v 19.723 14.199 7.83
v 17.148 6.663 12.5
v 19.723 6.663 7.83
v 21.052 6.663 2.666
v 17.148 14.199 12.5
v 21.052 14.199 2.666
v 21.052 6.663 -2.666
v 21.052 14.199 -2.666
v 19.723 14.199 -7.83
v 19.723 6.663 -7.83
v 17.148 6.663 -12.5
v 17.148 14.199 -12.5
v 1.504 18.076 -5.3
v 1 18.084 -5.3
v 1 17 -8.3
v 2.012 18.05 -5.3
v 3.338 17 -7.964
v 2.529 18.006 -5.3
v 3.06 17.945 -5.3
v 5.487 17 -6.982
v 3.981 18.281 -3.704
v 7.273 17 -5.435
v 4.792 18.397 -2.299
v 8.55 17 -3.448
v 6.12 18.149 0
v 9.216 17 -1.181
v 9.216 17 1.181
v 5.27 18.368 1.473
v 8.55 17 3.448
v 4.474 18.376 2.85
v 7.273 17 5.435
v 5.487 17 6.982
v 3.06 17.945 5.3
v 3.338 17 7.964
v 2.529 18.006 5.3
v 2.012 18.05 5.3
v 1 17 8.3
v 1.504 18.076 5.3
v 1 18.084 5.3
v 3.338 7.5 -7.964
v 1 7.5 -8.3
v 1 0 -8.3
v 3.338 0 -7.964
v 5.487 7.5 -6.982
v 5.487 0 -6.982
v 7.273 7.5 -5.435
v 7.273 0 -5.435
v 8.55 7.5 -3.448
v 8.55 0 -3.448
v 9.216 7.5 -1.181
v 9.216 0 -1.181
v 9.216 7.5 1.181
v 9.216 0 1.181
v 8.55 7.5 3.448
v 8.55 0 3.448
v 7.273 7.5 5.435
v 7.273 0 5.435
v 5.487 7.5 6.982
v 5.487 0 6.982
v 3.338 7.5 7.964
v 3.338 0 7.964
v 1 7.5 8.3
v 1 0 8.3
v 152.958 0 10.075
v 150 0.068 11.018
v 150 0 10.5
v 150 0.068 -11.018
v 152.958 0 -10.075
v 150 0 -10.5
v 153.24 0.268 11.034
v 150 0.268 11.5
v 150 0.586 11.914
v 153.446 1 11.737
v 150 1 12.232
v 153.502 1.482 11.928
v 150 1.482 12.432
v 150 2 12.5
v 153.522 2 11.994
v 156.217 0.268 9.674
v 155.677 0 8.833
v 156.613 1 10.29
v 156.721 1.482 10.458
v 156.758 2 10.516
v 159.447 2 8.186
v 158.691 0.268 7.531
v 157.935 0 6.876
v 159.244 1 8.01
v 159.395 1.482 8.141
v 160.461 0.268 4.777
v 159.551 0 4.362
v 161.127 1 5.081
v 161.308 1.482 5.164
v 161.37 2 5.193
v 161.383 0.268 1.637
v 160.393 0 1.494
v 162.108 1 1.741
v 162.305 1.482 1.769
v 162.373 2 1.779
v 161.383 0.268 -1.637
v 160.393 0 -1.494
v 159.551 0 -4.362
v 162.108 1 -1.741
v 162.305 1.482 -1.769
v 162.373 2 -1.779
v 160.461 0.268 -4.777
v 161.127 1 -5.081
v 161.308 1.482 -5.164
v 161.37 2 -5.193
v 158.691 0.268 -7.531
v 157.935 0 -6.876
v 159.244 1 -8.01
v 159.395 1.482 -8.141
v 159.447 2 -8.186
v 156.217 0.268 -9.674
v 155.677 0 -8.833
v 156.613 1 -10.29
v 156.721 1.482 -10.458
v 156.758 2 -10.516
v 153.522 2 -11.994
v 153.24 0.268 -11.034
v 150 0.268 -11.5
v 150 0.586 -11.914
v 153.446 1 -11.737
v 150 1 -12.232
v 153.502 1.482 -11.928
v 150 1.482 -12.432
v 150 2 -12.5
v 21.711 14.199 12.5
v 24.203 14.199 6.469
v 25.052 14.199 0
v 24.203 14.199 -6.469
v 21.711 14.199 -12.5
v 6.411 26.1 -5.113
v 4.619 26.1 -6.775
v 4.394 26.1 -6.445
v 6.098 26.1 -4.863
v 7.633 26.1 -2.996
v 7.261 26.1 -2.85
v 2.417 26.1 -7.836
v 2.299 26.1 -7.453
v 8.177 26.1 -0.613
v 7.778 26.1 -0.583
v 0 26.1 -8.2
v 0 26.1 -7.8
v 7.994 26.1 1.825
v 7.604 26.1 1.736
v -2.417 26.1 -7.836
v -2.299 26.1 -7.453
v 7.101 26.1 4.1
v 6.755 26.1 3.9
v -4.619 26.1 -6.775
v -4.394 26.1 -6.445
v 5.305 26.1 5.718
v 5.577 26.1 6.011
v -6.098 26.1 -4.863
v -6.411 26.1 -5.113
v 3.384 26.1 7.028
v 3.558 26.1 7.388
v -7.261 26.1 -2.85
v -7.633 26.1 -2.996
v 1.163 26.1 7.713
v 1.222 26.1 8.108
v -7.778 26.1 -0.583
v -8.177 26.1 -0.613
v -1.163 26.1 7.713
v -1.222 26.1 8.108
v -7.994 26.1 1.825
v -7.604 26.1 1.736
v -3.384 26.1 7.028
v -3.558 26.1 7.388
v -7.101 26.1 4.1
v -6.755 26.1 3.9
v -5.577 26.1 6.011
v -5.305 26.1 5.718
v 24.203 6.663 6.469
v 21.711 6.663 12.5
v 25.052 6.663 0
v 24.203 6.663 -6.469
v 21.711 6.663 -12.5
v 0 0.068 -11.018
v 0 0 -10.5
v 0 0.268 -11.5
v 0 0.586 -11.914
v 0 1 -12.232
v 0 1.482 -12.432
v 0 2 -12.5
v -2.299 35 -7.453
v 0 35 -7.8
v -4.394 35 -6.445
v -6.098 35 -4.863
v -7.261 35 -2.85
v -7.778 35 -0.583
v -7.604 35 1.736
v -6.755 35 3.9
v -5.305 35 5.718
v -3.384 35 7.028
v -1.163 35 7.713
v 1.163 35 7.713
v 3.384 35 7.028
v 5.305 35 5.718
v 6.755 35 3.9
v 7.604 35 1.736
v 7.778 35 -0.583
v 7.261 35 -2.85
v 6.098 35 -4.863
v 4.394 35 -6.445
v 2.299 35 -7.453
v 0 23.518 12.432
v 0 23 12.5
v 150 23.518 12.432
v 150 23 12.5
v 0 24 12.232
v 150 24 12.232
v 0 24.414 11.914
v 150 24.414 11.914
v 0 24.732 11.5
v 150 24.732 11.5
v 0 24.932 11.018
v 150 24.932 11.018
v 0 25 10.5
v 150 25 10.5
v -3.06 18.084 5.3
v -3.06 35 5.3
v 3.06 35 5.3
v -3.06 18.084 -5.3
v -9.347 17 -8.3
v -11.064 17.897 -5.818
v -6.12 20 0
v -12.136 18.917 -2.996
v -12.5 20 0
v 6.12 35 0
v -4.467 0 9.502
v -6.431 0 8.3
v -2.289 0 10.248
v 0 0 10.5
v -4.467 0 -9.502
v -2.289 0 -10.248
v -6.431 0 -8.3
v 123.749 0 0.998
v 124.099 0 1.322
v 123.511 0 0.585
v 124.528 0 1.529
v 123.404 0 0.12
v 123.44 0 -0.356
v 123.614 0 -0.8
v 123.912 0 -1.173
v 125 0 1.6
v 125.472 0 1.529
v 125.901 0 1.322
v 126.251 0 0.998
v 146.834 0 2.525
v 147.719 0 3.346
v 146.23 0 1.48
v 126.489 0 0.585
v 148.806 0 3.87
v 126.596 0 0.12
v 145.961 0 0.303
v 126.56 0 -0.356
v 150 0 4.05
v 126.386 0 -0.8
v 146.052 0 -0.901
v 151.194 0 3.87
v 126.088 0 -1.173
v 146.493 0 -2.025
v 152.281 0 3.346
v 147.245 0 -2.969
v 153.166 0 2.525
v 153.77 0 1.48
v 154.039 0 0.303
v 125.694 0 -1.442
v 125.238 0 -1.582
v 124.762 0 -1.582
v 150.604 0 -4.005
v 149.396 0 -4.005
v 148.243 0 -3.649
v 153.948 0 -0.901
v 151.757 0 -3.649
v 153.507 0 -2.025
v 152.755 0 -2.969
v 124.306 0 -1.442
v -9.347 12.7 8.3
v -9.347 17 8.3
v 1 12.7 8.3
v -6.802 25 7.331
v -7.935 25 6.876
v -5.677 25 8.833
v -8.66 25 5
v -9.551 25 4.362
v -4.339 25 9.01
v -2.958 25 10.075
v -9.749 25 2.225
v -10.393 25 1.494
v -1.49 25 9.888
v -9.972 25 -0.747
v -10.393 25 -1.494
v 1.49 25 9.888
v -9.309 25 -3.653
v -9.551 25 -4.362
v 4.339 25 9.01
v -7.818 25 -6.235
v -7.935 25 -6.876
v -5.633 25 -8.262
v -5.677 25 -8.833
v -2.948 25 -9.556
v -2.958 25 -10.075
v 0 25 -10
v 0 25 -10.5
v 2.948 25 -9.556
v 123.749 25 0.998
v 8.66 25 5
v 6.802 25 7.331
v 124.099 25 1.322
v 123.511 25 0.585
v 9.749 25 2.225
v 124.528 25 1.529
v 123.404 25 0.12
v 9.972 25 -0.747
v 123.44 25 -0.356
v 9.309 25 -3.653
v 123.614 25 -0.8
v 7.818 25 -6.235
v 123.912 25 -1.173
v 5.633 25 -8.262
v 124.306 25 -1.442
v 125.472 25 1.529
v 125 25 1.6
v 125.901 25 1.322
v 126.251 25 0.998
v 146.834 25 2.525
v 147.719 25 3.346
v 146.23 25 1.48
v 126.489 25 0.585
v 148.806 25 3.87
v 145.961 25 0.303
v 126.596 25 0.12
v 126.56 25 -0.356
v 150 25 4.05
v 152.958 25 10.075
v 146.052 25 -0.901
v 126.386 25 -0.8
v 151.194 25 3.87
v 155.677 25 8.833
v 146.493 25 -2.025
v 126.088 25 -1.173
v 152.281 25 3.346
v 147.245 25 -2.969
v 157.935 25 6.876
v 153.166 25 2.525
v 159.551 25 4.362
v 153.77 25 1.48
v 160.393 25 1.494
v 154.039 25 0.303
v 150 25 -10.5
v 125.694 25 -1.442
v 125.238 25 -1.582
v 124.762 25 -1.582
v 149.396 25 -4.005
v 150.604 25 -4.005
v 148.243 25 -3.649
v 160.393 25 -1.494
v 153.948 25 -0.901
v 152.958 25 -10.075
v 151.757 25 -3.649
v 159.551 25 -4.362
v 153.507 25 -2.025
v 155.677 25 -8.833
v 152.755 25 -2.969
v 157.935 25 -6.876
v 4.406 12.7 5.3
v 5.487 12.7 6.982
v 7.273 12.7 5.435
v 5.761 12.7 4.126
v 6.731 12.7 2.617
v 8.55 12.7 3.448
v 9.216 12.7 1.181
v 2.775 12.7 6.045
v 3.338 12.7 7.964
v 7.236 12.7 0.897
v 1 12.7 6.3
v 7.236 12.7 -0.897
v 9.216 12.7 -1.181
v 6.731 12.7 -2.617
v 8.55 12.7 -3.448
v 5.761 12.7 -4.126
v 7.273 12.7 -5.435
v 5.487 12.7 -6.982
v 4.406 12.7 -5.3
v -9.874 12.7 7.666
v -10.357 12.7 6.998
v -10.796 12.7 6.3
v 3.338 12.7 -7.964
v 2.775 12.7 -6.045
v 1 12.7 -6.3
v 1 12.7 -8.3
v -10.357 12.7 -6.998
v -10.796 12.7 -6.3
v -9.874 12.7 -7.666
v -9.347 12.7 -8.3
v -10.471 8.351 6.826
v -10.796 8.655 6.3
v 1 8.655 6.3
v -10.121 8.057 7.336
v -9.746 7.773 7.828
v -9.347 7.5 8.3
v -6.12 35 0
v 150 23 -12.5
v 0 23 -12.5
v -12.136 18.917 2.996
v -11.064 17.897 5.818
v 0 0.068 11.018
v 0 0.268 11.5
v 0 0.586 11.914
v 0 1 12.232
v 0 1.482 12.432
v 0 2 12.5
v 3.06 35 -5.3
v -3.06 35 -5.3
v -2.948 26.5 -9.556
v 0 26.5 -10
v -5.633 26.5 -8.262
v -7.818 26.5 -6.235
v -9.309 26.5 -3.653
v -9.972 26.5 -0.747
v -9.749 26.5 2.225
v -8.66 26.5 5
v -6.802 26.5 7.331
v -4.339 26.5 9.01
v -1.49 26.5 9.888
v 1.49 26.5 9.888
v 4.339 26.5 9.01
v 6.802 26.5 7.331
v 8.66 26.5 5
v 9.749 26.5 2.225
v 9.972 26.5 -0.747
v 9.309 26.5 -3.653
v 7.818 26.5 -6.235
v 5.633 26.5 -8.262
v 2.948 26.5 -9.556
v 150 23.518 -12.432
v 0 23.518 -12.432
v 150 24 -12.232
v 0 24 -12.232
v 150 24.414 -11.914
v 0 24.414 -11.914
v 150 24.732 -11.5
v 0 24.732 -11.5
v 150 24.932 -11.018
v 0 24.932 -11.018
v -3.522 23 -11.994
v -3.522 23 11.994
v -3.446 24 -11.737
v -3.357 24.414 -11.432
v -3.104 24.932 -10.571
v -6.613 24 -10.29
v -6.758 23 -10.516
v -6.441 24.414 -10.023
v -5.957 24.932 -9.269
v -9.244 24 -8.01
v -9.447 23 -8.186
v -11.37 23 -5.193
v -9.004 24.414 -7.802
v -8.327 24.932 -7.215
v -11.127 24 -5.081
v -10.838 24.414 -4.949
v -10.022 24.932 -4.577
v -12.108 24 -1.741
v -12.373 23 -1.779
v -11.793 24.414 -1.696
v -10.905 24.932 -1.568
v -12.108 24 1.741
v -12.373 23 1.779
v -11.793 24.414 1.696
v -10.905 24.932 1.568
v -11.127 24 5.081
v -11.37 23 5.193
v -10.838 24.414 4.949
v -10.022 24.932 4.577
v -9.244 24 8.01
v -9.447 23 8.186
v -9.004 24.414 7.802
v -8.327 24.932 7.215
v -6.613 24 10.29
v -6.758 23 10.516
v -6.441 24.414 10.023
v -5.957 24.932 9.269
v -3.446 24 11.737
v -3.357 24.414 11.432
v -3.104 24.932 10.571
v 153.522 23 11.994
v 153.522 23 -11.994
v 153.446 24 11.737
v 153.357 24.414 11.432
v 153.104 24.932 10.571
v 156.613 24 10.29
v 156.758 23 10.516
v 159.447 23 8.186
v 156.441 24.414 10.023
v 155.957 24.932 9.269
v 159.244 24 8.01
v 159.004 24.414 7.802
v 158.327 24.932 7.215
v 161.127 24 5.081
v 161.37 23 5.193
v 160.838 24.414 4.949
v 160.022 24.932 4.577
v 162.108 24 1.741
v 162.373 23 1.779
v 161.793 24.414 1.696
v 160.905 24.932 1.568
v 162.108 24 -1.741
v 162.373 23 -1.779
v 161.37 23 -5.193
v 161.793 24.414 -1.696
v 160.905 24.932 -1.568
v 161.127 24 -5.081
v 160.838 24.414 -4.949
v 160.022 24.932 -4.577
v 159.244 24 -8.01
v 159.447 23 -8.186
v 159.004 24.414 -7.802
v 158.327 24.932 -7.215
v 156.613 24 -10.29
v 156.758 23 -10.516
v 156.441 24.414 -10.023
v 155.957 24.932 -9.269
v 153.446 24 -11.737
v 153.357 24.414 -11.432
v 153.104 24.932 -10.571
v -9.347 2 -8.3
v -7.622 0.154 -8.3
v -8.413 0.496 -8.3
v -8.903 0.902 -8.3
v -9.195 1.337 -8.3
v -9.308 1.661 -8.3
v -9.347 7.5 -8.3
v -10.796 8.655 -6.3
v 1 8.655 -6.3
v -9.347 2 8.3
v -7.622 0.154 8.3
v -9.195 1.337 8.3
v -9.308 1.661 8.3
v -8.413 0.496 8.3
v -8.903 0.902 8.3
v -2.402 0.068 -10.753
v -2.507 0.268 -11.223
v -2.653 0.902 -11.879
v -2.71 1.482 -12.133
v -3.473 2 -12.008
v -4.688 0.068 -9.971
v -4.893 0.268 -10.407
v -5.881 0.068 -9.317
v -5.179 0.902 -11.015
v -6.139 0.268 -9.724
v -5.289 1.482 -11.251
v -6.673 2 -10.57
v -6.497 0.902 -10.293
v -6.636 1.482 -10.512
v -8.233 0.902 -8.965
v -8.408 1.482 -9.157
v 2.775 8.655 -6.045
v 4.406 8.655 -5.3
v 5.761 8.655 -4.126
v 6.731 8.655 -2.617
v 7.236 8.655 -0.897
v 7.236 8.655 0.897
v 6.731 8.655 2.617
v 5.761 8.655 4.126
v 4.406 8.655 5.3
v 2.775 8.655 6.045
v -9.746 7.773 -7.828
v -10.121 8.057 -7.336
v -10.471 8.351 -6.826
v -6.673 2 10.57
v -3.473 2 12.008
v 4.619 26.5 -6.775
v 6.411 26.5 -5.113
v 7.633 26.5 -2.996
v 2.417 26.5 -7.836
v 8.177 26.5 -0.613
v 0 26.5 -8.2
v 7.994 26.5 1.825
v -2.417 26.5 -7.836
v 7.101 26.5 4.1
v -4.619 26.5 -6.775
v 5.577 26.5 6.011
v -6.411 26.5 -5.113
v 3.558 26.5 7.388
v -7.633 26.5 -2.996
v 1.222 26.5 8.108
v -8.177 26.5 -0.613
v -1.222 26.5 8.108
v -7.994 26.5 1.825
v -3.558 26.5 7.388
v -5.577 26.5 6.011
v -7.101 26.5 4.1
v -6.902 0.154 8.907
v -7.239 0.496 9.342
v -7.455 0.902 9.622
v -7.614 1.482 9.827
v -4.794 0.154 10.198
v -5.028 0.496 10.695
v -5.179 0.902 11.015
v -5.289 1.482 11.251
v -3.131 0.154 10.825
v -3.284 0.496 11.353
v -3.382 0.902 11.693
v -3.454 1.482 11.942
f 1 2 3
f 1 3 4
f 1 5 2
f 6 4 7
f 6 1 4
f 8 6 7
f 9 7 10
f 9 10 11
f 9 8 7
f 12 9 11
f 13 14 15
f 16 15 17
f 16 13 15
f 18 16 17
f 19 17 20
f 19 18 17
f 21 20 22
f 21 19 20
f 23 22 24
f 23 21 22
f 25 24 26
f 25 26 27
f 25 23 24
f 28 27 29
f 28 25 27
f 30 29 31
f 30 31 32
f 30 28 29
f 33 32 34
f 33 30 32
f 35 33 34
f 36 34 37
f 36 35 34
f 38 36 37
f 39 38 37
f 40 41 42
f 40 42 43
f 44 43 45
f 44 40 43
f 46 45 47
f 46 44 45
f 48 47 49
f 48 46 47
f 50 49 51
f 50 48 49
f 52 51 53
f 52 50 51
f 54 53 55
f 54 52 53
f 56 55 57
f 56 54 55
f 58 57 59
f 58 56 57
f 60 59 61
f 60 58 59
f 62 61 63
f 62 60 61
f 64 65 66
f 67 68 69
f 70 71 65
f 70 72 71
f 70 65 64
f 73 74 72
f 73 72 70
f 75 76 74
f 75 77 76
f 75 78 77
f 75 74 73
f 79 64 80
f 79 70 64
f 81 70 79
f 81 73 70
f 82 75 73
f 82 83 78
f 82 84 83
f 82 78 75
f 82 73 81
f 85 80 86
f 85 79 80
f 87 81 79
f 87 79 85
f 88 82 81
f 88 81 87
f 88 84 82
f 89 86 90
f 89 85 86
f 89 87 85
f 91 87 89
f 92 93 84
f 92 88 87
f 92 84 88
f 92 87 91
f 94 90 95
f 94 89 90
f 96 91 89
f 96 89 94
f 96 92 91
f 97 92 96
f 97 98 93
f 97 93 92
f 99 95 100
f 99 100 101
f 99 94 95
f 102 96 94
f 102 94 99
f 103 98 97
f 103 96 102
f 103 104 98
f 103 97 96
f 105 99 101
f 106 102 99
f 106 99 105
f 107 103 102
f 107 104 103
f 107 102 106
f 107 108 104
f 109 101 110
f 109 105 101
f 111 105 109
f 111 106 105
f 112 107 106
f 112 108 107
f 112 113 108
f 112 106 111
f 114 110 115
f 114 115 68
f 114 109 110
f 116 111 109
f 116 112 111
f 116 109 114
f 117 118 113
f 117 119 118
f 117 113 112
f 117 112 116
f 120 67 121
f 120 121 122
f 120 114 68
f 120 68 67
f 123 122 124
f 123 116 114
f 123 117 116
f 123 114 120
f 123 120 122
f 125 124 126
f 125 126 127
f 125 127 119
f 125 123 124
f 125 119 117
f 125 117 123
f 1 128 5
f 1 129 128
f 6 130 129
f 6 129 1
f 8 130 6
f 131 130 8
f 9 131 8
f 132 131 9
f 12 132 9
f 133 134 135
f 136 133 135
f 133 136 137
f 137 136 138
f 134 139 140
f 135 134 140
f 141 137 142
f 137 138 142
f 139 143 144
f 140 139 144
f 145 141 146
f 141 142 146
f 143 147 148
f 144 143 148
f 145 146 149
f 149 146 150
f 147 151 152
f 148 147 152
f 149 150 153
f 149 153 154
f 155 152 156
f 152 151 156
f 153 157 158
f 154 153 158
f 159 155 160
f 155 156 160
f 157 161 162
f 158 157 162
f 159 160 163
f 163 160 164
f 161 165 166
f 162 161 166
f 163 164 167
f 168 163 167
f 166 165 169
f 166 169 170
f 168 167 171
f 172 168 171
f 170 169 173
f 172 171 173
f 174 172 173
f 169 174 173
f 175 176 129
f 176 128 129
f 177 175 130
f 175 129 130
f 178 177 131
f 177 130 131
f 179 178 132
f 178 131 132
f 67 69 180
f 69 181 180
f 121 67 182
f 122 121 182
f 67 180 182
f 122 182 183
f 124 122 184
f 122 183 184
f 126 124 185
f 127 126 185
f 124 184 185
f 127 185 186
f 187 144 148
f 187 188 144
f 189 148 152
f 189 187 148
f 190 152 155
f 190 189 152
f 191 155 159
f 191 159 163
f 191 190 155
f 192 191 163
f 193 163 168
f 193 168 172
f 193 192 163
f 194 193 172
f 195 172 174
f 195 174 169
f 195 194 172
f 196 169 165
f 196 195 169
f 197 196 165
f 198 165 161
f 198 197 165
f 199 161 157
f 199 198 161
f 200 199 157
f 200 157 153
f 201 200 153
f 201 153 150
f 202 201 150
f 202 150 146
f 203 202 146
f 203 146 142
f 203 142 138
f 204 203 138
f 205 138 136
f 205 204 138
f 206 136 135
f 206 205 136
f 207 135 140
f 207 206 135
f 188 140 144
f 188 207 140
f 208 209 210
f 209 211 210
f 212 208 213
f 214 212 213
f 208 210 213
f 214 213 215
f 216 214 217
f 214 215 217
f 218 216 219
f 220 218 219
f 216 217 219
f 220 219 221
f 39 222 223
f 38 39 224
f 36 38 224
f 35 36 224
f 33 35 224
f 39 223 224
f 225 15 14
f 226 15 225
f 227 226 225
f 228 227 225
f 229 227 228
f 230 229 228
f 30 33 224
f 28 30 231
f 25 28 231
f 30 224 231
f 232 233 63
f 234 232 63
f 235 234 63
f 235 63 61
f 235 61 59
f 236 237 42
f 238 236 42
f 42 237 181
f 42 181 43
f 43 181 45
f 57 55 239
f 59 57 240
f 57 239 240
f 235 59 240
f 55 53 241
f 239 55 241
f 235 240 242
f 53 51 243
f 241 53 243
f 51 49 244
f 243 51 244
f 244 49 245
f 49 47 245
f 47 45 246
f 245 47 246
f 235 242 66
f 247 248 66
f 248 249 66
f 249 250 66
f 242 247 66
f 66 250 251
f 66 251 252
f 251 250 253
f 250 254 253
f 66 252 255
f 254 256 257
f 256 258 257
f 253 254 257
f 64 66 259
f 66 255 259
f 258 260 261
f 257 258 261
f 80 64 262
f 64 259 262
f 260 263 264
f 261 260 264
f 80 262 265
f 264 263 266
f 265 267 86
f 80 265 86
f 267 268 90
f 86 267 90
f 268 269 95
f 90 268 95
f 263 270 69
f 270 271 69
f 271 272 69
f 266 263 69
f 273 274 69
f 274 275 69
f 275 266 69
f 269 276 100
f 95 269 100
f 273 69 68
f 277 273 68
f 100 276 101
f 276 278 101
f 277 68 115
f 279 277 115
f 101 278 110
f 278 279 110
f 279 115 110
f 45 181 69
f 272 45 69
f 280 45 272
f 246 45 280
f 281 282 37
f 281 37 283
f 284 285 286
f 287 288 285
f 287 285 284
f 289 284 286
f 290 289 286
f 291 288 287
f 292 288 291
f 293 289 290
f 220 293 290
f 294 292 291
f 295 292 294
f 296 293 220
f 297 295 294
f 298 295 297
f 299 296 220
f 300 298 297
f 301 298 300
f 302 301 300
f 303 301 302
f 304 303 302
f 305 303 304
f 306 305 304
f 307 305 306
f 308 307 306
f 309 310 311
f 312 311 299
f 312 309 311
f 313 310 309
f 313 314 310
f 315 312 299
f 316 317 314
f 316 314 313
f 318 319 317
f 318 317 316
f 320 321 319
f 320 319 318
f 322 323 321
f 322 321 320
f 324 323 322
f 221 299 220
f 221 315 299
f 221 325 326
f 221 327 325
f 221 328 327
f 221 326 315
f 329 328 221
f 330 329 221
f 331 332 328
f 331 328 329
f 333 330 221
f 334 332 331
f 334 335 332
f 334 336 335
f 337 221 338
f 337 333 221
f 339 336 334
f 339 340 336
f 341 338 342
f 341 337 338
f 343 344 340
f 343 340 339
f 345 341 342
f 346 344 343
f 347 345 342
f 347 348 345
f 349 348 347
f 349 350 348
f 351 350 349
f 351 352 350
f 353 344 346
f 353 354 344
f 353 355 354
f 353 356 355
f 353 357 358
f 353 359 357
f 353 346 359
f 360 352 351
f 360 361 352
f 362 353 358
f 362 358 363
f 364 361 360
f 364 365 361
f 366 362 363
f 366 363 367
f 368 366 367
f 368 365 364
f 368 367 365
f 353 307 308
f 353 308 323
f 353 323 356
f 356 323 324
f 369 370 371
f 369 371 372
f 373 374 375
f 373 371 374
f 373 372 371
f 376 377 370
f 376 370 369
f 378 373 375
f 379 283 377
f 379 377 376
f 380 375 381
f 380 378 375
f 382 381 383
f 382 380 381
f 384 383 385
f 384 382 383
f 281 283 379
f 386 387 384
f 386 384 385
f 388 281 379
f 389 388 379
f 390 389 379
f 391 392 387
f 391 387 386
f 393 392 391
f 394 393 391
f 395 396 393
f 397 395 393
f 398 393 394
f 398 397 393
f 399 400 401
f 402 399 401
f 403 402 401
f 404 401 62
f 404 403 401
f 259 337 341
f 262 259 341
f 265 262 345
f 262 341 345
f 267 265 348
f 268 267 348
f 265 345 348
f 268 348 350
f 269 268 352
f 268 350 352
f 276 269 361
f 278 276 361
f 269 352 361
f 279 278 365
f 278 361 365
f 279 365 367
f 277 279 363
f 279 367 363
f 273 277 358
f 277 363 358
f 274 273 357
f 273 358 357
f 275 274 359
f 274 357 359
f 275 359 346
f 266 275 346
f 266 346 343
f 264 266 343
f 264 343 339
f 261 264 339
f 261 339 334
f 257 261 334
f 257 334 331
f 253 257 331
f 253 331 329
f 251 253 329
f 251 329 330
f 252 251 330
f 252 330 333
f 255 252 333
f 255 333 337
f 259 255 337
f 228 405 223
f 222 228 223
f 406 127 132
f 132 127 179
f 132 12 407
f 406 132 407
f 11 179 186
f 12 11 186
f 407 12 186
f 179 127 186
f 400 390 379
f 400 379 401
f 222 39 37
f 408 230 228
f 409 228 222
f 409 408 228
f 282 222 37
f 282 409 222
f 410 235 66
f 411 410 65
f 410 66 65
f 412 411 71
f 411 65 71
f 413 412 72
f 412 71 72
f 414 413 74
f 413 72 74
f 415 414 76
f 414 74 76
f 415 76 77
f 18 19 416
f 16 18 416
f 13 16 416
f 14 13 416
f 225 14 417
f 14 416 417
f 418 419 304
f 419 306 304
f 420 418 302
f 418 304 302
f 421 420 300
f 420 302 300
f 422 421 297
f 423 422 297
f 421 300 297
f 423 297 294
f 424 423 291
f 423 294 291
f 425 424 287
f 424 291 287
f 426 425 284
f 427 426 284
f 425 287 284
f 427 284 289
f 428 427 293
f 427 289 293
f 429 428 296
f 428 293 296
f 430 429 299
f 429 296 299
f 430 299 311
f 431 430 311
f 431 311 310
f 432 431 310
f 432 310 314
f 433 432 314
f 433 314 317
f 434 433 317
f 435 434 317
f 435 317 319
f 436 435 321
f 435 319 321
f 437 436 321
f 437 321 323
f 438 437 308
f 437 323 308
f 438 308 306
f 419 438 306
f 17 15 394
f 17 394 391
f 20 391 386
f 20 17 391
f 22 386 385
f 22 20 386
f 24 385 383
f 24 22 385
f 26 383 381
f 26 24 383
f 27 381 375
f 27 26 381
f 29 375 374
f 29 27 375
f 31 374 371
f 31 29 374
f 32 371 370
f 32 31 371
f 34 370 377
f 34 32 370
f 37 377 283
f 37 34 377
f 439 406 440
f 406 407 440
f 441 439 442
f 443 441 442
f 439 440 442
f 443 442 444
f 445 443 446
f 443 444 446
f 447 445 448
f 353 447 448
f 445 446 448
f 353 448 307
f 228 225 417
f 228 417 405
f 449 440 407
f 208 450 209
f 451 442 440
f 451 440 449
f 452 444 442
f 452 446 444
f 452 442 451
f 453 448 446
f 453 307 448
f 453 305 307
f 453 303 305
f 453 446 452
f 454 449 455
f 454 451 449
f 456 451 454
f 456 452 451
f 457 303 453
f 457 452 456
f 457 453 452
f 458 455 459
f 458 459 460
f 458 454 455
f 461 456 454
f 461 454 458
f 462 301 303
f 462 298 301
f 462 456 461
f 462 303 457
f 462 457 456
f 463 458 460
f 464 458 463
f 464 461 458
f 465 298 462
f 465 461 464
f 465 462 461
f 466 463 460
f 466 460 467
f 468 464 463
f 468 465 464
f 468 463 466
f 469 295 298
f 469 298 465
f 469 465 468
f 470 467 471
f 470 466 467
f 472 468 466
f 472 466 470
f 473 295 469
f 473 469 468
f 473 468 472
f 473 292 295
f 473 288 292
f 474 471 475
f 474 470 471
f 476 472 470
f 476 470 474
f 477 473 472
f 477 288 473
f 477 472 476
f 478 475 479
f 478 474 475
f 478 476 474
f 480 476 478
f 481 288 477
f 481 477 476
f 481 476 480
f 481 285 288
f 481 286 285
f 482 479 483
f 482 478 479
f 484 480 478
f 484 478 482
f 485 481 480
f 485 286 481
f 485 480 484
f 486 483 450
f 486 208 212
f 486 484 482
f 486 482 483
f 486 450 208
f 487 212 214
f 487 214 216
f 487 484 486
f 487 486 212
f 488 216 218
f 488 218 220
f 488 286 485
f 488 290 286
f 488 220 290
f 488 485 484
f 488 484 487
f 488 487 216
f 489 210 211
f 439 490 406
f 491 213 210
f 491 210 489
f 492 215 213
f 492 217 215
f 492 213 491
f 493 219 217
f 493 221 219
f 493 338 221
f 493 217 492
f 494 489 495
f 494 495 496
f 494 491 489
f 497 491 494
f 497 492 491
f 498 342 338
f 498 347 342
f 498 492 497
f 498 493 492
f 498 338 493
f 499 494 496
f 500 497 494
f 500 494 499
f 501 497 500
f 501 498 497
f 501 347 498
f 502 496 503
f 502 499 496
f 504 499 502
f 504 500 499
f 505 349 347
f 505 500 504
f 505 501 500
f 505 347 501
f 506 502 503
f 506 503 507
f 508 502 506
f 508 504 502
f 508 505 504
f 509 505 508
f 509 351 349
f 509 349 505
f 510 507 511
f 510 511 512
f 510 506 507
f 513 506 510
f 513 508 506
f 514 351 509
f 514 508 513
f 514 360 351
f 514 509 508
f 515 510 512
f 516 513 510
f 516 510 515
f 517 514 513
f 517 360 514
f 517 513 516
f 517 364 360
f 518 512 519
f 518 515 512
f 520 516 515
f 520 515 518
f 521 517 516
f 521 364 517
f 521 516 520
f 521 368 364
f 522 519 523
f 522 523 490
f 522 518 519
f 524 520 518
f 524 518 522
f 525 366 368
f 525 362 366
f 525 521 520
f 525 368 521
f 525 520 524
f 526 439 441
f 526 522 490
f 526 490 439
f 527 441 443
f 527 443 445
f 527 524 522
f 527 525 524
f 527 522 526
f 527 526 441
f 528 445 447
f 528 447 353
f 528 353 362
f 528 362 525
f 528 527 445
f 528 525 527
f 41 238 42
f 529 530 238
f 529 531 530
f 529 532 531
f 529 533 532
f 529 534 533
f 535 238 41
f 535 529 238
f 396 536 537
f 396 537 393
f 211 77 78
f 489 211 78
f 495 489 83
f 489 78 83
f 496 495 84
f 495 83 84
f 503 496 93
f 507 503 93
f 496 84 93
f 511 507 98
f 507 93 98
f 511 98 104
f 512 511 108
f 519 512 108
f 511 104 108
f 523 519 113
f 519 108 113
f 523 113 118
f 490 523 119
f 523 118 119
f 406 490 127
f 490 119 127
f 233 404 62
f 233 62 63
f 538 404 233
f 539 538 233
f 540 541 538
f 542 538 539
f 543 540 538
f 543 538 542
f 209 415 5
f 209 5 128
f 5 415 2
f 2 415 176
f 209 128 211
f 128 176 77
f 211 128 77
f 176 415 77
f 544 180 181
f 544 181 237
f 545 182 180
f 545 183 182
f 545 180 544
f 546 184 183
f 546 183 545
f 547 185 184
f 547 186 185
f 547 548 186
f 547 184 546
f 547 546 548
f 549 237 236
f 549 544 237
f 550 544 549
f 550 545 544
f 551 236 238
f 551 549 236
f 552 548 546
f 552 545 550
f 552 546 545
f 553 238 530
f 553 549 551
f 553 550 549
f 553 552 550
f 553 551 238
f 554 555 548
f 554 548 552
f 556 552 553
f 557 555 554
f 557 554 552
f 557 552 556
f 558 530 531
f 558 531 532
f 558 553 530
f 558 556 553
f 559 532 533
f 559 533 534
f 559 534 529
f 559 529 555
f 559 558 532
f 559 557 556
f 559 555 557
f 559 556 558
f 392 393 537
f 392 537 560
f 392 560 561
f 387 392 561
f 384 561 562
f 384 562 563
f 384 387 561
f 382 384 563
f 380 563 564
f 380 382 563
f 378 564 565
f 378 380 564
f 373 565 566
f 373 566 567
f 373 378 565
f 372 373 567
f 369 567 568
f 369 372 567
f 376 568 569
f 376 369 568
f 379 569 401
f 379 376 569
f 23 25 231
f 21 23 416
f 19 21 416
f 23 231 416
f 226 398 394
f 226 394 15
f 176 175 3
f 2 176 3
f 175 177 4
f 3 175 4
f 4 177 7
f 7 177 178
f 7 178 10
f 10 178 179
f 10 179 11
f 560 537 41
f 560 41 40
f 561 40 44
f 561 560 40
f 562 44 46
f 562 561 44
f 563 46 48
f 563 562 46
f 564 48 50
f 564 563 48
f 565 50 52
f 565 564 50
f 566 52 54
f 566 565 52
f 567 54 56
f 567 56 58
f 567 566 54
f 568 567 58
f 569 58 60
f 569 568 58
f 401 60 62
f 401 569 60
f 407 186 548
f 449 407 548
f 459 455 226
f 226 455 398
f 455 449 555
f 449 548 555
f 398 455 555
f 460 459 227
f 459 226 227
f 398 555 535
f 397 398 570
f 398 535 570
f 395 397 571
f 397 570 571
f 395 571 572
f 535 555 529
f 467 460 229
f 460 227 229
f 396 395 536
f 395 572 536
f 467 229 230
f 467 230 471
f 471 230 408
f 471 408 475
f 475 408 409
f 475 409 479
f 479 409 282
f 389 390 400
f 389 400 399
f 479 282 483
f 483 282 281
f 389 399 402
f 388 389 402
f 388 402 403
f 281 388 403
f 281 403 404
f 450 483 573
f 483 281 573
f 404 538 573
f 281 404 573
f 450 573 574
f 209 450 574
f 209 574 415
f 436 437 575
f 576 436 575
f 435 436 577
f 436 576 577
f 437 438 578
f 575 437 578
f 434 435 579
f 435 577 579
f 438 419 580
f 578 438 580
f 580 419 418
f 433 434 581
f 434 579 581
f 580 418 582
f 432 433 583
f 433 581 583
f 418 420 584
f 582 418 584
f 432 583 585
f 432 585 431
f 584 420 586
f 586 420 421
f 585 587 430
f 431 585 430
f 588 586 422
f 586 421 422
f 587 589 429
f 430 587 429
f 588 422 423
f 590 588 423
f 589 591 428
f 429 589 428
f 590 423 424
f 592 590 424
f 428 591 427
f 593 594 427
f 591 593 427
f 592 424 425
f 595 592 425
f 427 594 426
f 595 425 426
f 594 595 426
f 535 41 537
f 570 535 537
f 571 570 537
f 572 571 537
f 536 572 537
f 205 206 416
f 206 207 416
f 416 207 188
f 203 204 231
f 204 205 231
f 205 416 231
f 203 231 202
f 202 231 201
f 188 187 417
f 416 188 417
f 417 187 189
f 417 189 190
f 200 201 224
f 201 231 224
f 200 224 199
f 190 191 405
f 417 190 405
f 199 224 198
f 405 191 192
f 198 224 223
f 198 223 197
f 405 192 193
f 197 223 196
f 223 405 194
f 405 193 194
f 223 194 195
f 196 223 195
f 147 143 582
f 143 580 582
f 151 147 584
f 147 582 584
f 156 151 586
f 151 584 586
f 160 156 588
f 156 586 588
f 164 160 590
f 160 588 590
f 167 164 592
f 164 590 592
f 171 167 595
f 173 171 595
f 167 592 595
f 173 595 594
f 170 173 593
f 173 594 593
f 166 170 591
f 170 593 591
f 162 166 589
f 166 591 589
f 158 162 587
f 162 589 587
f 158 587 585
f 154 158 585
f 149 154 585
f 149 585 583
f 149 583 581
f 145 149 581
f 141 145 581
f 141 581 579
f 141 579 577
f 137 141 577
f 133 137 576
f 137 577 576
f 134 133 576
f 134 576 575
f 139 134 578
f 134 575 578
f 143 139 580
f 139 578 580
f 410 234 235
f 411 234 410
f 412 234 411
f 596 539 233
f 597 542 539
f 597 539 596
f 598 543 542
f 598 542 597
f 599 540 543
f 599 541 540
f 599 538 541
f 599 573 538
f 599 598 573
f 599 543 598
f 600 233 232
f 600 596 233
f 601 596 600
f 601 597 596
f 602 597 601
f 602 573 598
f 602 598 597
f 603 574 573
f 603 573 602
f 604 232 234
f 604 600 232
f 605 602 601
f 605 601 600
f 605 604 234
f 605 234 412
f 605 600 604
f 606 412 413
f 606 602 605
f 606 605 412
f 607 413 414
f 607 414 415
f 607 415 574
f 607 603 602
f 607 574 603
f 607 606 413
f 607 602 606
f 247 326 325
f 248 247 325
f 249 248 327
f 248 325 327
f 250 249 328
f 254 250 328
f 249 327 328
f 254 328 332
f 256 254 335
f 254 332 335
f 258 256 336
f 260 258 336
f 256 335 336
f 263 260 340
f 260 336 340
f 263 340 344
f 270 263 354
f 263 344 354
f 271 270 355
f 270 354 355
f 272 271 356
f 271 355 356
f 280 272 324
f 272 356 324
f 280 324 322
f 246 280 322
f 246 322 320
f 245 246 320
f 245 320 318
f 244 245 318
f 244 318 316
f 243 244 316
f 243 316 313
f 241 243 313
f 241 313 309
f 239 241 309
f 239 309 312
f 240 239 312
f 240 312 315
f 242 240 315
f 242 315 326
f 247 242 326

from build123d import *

# Parameters (mm, degrees)
SALIENTE_EXTRUIR1_DEPTH    = 25
CROQUIS5_R                 = 4.05
CROQUIS5_R_2               = 1.6
CORTAR_EXTRUIR1_DEPTH      = 51.5
REDONDEO2_R                = 2
CORTAR_EXTRUIR2_REACH      = 168.696
CORTAR_EXTRUIR4_DEPTH      = 1
CORTAR_EXTRUIR4_DEPTH_BACK = 167.695830887
CROQUIS13_W                = 3.831890827
CROQUIS13_H                = 7.53605196


with BuildPart() as part:
    # Croquis2 → Saliente-Extruir1 (new body)
    with BuildSketch(Plane(origin=(0, 0, 0), x_dir=(1, 0, 0), z_dir=(0, 1, 0))):
        with BuildLine():
            Line((0, -12.5), (150, -12.5))
            ThreePointArc((150, -12.5), (162.5, 0), (150, 12.5))
            Line((150, 12.5), (0, 12.5))
            ThreePointArc((0, 12.5), (-12.5, 0), (0, -12.5))
        make_face()
    extrude(amount=SALIENTE_EXTRUIR1_DEPTH)

    # Croquis5 → Cortar-Extruir1 (cut)
    with BuildSketch(Plane(origin=(0, 25, 0), x_dir=(1, 0, 0), z_dir=(0, 1, 0))):
        with Locations(Location((150, 0, 0), (0, 0, 270))):
            Circle(CROQUIS5_R)
        with Locations(Location((125, 0, 0), (0, 0, 270))):
            Circle(CROQUIS5_R_2)
    extrude(amount=-CORTAR_EXTRUIR1_DEPTH, mode=Mode.SUBTRACT)

    # Croquis9 → Revolución2 (revolve)
    with BuildSketch(Plane.XY, mode=Mode.PRIVATE) as revoluci_n2_sk:
        Polygon((0, 25), (0, 35), (7.8, 35), (7.8, 26.5), (7.8, 26.1), (8.2, 26.1), (8.2, 26.5), (10, 26.5), (10, 25), align=None)
    revolve(revoluci_n2_sk.sketch.rotate(Axis((0, 25, 0), (0, 1, 0)), 90), axis=Axis((0, 25, 0), (0, 1, 0)))

    # Croquis1 → Cortar-Revolución1 (revolve, cut)
    with BuildSketch(Plane.XY, mode=Mode.PRIVATE) as cortar_revoluci_n1_sk:
        Polygon((9.3, 17), (1, 20), (1, 0), (9.3, 0), (9.3, 7.5), (7.3, 8.654700538), (7.3, 12.7), (9.3, 12.7), align=None)
    revolve(cortar_revoluci_n1_sk.sketch.rotate(Axis((1, 20, 0), (0, -1, 0)), 180), axis=Axis((1, 20, 0), (0, -1, 0)), mode=Mode.SUBTRACT)

    # Redondeo2
    redondeo2_edges = [part.edges().sort_by_distance(p)[0] for p in [
        (162.5, 25, 0),
        (75, 25, -12.5),
        (-12.5, 25, 0),
        (75, 0, -12.5),
        (162.5, 0, 0),
        (75, 0, 12.5),
        (-12.5, 0, 0),
        (75, 25, 12.5),
    ]]
    fillet(redondeo2_edges, radius=REDONDEO2_R)

    # Cortar-Extruir2: up to this cone (the profile starts outside it)
    cortar_extruir2_end = Plane(origin=(1, 35, 0), z_dir=(0, -1, 0)).offset(15.000001) * Cone(2.767e-06, 426.608933333, 154.195999, align=(Align.CENTER, Align.CENTER, Align.MIN), mode=Mode.PRIVATE)
    # Croquis10 → Cortar-Extruir2 (cut, up to the surface)
    with BuildSketch(Plane(origin=(0, 35, 0), x_dir=(1, 0, 0), z_dir=(0, 1, 0)), mode=Mode.PRIVATE) as cortar_extruir2_sk1:
        Polygon((6.119912853, 0), (3.059956427, 5.3), (-3.059956427, 5.3), (-6.119912853, 0), (-3.059956427, -5.3), (3.059956427, -5.3), align=None)
    cortar_extruir2_tool1 = extrude(cortar_extruir2_sk1.sketch, amount=-CORTAR_EXTRUIR2_REACH, mode=Mode.PRIVATE) - cortar_extruir2_end
    add(cortar_extruir2_tool1.solids().sort_by_distance((0, 35, 0))[0], mode=Mode.SUBTRACT)

    # Croquis12 → Cortar-Extruir4 (cut, two sides: drawn at the far end of the back side and taken through both)
    with BuildSketch(Plane(origin=(0, 0, 0), x_dir=(0, 0, -1), z_dir=(1, 0, 0)).offset(-CORTAR_EXTRUIR4_DEPTH_BACK)):
        Polygon((8.3, 7.5), (6.3, 8.654700538), (6.3, 12.7), (8.3, 12.7), (8.3, 17), (0, 20), (-8.3, 17), (-8.3, 12.7), (-6.3, 12.7), (-6.3, 8.654700538), (-8.3, 7.5), (-8.3, 0), (8.3, 0), align=None)
    extrude(amount=CORTAR_EXTRUIR4_DEPTH + CORTAR_EXTRUIR4_DEPTH_BACK, mode=Mode.SUBTRACT)

    # Croquis13 → Cortar-Revolución2 (revolve, cut)
    with BuildSketch(Plane.XY):
        with Locations((23.136343839, 10.430899618)):
            Rectangle(CROQUIS13_W, CROQUIS13_H)
    revolve(axis=Axis((0, 0, 0), (0, 1, 0)), mode=Mode.SUBTRACT)


solid = part.part
